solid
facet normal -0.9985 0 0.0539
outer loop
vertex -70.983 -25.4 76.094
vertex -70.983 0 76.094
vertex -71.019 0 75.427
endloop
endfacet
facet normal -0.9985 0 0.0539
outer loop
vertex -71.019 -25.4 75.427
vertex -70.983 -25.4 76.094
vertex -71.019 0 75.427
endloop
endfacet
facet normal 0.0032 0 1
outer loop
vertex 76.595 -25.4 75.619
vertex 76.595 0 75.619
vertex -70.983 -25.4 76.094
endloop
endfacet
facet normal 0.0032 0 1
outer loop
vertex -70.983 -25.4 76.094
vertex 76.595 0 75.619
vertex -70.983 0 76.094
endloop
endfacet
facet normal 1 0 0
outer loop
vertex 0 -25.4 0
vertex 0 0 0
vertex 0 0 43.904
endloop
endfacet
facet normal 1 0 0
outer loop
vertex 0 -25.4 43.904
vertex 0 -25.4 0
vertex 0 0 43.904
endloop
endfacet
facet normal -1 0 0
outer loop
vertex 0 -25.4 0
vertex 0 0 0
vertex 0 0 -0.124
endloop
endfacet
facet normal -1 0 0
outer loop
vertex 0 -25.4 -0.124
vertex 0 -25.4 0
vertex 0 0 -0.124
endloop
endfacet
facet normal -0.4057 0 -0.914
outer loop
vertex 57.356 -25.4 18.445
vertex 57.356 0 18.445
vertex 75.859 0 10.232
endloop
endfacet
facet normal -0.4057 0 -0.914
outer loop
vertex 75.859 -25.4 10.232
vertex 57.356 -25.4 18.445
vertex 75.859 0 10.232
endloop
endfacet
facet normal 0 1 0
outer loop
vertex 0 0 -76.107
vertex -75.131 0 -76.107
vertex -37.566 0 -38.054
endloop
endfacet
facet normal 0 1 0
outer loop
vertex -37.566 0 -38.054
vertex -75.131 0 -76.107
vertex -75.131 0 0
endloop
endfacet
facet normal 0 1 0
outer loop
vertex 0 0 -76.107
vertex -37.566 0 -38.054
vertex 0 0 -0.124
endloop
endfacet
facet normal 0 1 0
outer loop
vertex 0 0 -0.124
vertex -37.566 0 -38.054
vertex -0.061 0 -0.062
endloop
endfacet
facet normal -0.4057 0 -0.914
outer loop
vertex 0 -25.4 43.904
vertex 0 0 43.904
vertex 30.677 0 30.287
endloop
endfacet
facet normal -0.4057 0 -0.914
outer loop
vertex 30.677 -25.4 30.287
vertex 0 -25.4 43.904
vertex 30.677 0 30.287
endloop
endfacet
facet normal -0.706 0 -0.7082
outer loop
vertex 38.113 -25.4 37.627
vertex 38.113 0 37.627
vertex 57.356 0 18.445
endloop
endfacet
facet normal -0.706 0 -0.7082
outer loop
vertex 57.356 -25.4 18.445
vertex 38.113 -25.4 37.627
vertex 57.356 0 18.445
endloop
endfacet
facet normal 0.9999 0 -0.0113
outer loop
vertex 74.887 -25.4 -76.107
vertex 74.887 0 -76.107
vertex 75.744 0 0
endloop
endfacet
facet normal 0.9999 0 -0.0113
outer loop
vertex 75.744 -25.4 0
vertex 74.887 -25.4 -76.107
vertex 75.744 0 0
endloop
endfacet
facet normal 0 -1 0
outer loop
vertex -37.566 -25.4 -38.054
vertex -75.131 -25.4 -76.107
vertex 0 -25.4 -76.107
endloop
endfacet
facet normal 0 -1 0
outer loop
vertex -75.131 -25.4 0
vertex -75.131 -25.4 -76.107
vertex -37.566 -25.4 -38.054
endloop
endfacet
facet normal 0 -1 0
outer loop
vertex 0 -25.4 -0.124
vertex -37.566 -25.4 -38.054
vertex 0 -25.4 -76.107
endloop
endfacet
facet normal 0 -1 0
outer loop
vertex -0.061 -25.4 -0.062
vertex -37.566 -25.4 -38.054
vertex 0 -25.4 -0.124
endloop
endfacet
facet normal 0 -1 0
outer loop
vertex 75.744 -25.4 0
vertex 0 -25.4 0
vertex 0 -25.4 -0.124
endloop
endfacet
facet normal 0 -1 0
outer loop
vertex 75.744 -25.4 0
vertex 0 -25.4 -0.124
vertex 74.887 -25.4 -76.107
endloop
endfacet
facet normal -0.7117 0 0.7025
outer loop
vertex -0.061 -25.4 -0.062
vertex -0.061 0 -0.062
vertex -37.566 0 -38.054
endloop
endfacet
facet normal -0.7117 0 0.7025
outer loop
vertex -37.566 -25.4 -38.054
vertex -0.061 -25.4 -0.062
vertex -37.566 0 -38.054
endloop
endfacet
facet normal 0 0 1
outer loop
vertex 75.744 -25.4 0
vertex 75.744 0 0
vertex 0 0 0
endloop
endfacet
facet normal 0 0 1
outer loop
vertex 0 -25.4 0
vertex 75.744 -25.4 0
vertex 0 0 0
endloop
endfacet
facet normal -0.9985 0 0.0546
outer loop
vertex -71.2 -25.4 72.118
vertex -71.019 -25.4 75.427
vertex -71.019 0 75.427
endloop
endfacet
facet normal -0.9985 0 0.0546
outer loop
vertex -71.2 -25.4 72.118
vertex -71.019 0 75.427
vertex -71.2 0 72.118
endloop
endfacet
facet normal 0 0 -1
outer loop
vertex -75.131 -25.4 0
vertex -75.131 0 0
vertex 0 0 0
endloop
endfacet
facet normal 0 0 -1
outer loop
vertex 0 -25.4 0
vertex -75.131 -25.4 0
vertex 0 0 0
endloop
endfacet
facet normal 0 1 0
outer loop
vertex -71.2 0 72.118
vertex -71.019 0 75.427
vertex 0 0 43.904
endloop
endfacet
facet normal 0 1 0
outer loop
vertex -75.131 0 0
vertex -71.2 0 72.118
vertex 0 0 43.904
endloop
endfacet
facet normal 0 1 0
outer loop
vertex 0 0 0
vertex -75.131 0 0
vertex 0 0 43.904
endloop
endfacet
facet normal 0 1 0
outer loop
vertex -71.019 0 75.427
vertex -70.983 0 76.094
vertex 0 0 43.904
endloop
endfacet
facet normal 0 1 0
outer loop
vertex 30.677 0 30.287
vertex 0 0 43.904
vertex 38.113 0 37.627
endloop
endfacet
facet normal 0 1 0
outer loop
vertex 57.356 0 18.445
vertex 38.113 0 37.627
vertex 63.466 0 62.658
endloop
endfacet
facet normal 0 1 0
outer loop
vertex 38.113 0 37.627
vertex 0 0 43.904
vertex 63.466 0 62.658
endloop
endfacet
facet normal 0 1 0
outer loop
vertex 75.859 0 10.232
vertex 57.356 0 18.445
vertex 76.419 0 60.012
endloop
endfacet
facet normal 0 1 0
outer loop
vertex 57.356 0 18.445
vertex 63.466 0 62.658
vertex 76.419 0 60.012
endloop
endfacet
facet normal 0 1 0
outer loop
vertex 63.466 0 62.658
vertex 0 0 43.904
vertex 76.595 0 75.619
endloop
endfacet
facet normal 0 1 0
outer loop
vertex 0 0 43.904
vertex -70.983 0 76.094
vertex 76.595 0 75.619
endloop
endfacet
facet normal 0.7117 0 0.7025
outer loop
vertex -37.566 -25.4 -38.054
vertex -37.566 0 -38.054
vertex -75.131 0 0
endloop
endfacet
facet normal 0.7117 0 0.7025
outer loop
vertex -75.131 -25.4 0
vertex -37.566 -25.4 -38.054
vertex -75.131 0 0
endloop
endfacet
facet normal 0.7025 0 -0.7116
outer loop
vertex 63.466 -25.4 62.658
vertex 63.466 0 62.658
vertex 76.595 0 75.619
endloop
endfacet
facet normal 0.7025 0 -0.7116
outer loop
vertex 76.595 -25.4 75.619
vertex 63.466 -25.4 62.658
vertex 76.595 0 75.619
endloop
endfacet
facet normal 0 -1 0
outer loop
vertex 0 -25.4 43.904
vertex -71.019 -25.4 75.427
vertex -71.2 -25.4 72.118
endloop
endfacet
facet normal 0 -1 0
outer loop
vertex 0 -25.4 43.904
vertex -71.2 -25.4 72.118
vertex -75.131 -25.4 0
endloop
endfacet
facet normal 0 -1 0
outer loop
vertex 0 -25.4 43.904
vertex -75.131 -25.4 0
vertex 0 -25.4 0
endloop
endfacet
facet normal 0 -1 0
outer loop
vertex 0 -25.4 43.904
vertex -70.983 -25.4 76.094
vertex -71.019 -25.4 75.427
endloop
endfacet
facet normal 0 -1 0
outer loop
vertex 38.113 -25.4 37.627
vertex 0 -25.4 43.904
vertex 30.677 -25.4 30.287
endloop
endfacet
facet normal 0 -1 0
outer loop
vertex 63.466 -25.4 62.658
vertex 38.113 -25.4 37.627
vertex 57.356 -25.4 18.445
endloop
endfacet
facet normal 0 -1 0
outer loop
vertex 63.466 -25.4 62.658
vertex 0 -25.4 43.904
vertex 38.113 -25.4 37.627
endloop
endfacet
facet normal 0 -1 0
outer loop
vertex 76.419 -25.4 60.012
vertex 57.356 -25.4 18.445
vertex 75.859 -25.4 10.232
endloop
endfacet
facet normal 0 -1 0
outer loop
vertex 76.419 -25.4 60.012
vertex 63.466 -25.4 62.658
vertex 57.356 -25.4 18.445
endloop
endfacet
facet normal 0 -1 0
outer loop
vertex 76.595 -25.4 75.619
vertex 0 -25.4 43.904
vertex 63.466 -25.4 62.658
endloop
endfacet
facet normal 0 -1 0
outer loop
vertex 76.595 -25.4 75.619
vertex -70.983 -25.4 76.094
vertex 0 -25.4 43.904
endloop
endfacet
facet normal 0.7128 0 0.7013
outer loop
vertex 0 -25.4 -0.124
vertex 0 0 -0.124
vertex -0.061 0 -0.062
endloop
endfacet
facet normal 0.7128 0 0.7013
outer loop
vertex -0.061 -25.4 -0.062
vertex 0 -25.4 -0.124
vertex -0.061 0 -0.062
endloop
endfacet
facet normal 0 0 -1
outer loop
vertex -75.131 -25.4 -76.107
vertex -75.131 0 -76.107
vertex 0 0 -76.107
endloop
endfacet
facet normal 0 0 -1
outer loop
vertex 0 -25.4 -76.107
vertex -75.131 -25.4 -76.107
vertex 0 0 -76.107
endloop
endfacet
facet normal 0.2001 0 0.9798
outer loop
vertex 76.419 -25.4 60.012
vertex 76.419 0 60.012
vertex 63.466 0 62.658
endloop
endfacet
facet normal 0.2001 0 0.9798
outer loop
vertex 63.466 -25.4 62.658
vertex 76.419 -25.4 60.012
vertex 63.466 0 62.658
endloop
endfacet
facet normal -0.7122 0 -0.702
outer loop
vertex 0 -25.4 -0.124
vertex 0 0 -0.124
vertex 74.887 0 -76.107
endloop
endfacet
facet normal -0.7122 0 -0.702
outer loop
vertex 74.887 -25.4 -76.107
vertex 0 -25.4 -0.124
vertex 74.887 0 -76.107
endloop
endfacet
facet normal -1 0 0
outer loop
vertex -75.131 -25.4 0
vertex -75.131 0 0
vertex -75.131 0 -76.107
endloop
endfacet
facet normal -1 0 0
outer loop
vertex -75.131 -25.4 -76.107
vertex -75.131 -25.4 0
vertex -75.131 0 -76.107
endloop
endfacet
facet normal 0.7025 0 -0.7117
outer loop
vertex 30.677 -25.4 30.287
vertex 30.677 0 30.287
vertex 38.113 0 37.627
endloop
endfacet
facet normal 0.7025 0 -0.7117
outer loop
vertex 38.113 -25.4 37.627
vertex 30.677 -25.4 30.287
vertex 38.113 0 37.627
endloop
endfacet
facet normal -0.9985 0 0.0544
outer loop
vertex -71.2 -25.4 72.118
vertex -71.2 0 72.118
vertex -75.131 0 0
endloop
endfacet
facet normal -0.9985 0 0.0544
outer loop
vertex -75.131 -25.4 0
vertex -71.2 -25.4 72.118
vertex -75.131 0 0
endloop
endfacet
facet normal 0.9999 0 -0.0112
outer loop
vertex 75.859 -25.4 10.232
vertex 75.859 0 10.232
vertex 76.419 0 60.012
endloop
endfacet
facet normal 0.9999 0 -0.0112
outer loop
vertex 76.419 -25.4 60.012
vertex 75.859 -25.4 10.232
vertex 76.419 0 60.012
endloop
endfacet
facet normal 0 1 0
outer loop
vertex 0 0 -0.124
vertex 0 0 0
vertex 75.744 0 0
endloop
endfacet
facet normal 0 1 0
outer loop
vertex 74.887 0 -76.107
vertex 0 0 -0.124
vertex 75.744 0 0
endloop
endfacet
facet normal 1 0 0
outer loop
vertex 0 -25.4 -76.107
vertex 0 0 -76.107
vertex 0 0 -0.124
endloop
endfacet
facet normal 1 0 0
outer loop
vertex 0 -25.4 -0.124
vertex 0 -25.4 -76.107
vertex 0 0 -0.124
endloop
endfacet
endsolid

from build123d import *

# Parameters (mm, degrees)
F1_DEPTH = 25.4


with BuildPart() as f1:
    # F0 (on Front) → F1 (new body)
    with BuildSketch(Plane.XZ):
        Polygon((-71.0192831951, 75.4273998377), (-71.199706528, 72.117898654), (-0.1219660044, 0), (0, 0), (0, 43.9035848512), align=None)
        Polygon((-0.1219660044, 0), (-71.199706528, 72.117898654), (-75.131341815, 0), align=None)
        Polygon((0, 75.8654908862), (-70.9829569664, 76.0937310424), (-71.0192831951, 75.4273998377), (0, 43.9035848512), (0, 75.6192058325), align=None)
        Polygon((38.112613931, 37.6271010601), (0, 75.6192058325), (0, 43.9035848512), (30.677395733, 30.2865993813), align=None)
        Polygon((63.4661180812, 62.6576293942), (0, 75.6192058325), (38.112613931, 37.6271010601), align=None)
        Polygon((76.594941318, 75.6192058325), (0, 75.8654908862), (0, 75.6192058325), (63.4661180812, 62.6576293942), align=None)
        Polygon((75.8590663753, 10.2315022017), (76.4192999244, 60.0122232837), (63.4661180812, 62.6576293942), (38.112613931, 37.6271010601), (57.3559570858, 18.4446038788), align=None)
    extrude(amount=F1_DEPTH)


with BuildPart() as f1b:
    # F0 (on Front) → F1, piece 2 (new body)
    with BuildSketch(Plane.XZ):
        Polygon((0, -0.123750866), (-0.0610325414, -0.0618251688), (-37.5656709075, -38.053534925), (0, -76.10706985), align=None)
        Polygon((-37.5656709075, -38.053534925), (-75.131341815, 0), (-75.131341815, -76.10706985), align=None)
        Polygon((-37.5656709075, -38.053534925), (-75.131341815, -76.10706985), (0, -76.10706985), align=None)
    extrude(amount=F1_DEPTH)


with BuildPart() as f1c:
    # F0 (on Front) → F1, piece 3 (new body)
    with BuildSketch(Plane.XZ):
        Polygon((75.7439207794, 0), (0, 0), (0, -0.123750866), (74.8874098063, -76.10706985), align=None)
    extrude(amount=F1_DEPTH)


solid = Compound([f1.part, f1b.part, f1c.part])
